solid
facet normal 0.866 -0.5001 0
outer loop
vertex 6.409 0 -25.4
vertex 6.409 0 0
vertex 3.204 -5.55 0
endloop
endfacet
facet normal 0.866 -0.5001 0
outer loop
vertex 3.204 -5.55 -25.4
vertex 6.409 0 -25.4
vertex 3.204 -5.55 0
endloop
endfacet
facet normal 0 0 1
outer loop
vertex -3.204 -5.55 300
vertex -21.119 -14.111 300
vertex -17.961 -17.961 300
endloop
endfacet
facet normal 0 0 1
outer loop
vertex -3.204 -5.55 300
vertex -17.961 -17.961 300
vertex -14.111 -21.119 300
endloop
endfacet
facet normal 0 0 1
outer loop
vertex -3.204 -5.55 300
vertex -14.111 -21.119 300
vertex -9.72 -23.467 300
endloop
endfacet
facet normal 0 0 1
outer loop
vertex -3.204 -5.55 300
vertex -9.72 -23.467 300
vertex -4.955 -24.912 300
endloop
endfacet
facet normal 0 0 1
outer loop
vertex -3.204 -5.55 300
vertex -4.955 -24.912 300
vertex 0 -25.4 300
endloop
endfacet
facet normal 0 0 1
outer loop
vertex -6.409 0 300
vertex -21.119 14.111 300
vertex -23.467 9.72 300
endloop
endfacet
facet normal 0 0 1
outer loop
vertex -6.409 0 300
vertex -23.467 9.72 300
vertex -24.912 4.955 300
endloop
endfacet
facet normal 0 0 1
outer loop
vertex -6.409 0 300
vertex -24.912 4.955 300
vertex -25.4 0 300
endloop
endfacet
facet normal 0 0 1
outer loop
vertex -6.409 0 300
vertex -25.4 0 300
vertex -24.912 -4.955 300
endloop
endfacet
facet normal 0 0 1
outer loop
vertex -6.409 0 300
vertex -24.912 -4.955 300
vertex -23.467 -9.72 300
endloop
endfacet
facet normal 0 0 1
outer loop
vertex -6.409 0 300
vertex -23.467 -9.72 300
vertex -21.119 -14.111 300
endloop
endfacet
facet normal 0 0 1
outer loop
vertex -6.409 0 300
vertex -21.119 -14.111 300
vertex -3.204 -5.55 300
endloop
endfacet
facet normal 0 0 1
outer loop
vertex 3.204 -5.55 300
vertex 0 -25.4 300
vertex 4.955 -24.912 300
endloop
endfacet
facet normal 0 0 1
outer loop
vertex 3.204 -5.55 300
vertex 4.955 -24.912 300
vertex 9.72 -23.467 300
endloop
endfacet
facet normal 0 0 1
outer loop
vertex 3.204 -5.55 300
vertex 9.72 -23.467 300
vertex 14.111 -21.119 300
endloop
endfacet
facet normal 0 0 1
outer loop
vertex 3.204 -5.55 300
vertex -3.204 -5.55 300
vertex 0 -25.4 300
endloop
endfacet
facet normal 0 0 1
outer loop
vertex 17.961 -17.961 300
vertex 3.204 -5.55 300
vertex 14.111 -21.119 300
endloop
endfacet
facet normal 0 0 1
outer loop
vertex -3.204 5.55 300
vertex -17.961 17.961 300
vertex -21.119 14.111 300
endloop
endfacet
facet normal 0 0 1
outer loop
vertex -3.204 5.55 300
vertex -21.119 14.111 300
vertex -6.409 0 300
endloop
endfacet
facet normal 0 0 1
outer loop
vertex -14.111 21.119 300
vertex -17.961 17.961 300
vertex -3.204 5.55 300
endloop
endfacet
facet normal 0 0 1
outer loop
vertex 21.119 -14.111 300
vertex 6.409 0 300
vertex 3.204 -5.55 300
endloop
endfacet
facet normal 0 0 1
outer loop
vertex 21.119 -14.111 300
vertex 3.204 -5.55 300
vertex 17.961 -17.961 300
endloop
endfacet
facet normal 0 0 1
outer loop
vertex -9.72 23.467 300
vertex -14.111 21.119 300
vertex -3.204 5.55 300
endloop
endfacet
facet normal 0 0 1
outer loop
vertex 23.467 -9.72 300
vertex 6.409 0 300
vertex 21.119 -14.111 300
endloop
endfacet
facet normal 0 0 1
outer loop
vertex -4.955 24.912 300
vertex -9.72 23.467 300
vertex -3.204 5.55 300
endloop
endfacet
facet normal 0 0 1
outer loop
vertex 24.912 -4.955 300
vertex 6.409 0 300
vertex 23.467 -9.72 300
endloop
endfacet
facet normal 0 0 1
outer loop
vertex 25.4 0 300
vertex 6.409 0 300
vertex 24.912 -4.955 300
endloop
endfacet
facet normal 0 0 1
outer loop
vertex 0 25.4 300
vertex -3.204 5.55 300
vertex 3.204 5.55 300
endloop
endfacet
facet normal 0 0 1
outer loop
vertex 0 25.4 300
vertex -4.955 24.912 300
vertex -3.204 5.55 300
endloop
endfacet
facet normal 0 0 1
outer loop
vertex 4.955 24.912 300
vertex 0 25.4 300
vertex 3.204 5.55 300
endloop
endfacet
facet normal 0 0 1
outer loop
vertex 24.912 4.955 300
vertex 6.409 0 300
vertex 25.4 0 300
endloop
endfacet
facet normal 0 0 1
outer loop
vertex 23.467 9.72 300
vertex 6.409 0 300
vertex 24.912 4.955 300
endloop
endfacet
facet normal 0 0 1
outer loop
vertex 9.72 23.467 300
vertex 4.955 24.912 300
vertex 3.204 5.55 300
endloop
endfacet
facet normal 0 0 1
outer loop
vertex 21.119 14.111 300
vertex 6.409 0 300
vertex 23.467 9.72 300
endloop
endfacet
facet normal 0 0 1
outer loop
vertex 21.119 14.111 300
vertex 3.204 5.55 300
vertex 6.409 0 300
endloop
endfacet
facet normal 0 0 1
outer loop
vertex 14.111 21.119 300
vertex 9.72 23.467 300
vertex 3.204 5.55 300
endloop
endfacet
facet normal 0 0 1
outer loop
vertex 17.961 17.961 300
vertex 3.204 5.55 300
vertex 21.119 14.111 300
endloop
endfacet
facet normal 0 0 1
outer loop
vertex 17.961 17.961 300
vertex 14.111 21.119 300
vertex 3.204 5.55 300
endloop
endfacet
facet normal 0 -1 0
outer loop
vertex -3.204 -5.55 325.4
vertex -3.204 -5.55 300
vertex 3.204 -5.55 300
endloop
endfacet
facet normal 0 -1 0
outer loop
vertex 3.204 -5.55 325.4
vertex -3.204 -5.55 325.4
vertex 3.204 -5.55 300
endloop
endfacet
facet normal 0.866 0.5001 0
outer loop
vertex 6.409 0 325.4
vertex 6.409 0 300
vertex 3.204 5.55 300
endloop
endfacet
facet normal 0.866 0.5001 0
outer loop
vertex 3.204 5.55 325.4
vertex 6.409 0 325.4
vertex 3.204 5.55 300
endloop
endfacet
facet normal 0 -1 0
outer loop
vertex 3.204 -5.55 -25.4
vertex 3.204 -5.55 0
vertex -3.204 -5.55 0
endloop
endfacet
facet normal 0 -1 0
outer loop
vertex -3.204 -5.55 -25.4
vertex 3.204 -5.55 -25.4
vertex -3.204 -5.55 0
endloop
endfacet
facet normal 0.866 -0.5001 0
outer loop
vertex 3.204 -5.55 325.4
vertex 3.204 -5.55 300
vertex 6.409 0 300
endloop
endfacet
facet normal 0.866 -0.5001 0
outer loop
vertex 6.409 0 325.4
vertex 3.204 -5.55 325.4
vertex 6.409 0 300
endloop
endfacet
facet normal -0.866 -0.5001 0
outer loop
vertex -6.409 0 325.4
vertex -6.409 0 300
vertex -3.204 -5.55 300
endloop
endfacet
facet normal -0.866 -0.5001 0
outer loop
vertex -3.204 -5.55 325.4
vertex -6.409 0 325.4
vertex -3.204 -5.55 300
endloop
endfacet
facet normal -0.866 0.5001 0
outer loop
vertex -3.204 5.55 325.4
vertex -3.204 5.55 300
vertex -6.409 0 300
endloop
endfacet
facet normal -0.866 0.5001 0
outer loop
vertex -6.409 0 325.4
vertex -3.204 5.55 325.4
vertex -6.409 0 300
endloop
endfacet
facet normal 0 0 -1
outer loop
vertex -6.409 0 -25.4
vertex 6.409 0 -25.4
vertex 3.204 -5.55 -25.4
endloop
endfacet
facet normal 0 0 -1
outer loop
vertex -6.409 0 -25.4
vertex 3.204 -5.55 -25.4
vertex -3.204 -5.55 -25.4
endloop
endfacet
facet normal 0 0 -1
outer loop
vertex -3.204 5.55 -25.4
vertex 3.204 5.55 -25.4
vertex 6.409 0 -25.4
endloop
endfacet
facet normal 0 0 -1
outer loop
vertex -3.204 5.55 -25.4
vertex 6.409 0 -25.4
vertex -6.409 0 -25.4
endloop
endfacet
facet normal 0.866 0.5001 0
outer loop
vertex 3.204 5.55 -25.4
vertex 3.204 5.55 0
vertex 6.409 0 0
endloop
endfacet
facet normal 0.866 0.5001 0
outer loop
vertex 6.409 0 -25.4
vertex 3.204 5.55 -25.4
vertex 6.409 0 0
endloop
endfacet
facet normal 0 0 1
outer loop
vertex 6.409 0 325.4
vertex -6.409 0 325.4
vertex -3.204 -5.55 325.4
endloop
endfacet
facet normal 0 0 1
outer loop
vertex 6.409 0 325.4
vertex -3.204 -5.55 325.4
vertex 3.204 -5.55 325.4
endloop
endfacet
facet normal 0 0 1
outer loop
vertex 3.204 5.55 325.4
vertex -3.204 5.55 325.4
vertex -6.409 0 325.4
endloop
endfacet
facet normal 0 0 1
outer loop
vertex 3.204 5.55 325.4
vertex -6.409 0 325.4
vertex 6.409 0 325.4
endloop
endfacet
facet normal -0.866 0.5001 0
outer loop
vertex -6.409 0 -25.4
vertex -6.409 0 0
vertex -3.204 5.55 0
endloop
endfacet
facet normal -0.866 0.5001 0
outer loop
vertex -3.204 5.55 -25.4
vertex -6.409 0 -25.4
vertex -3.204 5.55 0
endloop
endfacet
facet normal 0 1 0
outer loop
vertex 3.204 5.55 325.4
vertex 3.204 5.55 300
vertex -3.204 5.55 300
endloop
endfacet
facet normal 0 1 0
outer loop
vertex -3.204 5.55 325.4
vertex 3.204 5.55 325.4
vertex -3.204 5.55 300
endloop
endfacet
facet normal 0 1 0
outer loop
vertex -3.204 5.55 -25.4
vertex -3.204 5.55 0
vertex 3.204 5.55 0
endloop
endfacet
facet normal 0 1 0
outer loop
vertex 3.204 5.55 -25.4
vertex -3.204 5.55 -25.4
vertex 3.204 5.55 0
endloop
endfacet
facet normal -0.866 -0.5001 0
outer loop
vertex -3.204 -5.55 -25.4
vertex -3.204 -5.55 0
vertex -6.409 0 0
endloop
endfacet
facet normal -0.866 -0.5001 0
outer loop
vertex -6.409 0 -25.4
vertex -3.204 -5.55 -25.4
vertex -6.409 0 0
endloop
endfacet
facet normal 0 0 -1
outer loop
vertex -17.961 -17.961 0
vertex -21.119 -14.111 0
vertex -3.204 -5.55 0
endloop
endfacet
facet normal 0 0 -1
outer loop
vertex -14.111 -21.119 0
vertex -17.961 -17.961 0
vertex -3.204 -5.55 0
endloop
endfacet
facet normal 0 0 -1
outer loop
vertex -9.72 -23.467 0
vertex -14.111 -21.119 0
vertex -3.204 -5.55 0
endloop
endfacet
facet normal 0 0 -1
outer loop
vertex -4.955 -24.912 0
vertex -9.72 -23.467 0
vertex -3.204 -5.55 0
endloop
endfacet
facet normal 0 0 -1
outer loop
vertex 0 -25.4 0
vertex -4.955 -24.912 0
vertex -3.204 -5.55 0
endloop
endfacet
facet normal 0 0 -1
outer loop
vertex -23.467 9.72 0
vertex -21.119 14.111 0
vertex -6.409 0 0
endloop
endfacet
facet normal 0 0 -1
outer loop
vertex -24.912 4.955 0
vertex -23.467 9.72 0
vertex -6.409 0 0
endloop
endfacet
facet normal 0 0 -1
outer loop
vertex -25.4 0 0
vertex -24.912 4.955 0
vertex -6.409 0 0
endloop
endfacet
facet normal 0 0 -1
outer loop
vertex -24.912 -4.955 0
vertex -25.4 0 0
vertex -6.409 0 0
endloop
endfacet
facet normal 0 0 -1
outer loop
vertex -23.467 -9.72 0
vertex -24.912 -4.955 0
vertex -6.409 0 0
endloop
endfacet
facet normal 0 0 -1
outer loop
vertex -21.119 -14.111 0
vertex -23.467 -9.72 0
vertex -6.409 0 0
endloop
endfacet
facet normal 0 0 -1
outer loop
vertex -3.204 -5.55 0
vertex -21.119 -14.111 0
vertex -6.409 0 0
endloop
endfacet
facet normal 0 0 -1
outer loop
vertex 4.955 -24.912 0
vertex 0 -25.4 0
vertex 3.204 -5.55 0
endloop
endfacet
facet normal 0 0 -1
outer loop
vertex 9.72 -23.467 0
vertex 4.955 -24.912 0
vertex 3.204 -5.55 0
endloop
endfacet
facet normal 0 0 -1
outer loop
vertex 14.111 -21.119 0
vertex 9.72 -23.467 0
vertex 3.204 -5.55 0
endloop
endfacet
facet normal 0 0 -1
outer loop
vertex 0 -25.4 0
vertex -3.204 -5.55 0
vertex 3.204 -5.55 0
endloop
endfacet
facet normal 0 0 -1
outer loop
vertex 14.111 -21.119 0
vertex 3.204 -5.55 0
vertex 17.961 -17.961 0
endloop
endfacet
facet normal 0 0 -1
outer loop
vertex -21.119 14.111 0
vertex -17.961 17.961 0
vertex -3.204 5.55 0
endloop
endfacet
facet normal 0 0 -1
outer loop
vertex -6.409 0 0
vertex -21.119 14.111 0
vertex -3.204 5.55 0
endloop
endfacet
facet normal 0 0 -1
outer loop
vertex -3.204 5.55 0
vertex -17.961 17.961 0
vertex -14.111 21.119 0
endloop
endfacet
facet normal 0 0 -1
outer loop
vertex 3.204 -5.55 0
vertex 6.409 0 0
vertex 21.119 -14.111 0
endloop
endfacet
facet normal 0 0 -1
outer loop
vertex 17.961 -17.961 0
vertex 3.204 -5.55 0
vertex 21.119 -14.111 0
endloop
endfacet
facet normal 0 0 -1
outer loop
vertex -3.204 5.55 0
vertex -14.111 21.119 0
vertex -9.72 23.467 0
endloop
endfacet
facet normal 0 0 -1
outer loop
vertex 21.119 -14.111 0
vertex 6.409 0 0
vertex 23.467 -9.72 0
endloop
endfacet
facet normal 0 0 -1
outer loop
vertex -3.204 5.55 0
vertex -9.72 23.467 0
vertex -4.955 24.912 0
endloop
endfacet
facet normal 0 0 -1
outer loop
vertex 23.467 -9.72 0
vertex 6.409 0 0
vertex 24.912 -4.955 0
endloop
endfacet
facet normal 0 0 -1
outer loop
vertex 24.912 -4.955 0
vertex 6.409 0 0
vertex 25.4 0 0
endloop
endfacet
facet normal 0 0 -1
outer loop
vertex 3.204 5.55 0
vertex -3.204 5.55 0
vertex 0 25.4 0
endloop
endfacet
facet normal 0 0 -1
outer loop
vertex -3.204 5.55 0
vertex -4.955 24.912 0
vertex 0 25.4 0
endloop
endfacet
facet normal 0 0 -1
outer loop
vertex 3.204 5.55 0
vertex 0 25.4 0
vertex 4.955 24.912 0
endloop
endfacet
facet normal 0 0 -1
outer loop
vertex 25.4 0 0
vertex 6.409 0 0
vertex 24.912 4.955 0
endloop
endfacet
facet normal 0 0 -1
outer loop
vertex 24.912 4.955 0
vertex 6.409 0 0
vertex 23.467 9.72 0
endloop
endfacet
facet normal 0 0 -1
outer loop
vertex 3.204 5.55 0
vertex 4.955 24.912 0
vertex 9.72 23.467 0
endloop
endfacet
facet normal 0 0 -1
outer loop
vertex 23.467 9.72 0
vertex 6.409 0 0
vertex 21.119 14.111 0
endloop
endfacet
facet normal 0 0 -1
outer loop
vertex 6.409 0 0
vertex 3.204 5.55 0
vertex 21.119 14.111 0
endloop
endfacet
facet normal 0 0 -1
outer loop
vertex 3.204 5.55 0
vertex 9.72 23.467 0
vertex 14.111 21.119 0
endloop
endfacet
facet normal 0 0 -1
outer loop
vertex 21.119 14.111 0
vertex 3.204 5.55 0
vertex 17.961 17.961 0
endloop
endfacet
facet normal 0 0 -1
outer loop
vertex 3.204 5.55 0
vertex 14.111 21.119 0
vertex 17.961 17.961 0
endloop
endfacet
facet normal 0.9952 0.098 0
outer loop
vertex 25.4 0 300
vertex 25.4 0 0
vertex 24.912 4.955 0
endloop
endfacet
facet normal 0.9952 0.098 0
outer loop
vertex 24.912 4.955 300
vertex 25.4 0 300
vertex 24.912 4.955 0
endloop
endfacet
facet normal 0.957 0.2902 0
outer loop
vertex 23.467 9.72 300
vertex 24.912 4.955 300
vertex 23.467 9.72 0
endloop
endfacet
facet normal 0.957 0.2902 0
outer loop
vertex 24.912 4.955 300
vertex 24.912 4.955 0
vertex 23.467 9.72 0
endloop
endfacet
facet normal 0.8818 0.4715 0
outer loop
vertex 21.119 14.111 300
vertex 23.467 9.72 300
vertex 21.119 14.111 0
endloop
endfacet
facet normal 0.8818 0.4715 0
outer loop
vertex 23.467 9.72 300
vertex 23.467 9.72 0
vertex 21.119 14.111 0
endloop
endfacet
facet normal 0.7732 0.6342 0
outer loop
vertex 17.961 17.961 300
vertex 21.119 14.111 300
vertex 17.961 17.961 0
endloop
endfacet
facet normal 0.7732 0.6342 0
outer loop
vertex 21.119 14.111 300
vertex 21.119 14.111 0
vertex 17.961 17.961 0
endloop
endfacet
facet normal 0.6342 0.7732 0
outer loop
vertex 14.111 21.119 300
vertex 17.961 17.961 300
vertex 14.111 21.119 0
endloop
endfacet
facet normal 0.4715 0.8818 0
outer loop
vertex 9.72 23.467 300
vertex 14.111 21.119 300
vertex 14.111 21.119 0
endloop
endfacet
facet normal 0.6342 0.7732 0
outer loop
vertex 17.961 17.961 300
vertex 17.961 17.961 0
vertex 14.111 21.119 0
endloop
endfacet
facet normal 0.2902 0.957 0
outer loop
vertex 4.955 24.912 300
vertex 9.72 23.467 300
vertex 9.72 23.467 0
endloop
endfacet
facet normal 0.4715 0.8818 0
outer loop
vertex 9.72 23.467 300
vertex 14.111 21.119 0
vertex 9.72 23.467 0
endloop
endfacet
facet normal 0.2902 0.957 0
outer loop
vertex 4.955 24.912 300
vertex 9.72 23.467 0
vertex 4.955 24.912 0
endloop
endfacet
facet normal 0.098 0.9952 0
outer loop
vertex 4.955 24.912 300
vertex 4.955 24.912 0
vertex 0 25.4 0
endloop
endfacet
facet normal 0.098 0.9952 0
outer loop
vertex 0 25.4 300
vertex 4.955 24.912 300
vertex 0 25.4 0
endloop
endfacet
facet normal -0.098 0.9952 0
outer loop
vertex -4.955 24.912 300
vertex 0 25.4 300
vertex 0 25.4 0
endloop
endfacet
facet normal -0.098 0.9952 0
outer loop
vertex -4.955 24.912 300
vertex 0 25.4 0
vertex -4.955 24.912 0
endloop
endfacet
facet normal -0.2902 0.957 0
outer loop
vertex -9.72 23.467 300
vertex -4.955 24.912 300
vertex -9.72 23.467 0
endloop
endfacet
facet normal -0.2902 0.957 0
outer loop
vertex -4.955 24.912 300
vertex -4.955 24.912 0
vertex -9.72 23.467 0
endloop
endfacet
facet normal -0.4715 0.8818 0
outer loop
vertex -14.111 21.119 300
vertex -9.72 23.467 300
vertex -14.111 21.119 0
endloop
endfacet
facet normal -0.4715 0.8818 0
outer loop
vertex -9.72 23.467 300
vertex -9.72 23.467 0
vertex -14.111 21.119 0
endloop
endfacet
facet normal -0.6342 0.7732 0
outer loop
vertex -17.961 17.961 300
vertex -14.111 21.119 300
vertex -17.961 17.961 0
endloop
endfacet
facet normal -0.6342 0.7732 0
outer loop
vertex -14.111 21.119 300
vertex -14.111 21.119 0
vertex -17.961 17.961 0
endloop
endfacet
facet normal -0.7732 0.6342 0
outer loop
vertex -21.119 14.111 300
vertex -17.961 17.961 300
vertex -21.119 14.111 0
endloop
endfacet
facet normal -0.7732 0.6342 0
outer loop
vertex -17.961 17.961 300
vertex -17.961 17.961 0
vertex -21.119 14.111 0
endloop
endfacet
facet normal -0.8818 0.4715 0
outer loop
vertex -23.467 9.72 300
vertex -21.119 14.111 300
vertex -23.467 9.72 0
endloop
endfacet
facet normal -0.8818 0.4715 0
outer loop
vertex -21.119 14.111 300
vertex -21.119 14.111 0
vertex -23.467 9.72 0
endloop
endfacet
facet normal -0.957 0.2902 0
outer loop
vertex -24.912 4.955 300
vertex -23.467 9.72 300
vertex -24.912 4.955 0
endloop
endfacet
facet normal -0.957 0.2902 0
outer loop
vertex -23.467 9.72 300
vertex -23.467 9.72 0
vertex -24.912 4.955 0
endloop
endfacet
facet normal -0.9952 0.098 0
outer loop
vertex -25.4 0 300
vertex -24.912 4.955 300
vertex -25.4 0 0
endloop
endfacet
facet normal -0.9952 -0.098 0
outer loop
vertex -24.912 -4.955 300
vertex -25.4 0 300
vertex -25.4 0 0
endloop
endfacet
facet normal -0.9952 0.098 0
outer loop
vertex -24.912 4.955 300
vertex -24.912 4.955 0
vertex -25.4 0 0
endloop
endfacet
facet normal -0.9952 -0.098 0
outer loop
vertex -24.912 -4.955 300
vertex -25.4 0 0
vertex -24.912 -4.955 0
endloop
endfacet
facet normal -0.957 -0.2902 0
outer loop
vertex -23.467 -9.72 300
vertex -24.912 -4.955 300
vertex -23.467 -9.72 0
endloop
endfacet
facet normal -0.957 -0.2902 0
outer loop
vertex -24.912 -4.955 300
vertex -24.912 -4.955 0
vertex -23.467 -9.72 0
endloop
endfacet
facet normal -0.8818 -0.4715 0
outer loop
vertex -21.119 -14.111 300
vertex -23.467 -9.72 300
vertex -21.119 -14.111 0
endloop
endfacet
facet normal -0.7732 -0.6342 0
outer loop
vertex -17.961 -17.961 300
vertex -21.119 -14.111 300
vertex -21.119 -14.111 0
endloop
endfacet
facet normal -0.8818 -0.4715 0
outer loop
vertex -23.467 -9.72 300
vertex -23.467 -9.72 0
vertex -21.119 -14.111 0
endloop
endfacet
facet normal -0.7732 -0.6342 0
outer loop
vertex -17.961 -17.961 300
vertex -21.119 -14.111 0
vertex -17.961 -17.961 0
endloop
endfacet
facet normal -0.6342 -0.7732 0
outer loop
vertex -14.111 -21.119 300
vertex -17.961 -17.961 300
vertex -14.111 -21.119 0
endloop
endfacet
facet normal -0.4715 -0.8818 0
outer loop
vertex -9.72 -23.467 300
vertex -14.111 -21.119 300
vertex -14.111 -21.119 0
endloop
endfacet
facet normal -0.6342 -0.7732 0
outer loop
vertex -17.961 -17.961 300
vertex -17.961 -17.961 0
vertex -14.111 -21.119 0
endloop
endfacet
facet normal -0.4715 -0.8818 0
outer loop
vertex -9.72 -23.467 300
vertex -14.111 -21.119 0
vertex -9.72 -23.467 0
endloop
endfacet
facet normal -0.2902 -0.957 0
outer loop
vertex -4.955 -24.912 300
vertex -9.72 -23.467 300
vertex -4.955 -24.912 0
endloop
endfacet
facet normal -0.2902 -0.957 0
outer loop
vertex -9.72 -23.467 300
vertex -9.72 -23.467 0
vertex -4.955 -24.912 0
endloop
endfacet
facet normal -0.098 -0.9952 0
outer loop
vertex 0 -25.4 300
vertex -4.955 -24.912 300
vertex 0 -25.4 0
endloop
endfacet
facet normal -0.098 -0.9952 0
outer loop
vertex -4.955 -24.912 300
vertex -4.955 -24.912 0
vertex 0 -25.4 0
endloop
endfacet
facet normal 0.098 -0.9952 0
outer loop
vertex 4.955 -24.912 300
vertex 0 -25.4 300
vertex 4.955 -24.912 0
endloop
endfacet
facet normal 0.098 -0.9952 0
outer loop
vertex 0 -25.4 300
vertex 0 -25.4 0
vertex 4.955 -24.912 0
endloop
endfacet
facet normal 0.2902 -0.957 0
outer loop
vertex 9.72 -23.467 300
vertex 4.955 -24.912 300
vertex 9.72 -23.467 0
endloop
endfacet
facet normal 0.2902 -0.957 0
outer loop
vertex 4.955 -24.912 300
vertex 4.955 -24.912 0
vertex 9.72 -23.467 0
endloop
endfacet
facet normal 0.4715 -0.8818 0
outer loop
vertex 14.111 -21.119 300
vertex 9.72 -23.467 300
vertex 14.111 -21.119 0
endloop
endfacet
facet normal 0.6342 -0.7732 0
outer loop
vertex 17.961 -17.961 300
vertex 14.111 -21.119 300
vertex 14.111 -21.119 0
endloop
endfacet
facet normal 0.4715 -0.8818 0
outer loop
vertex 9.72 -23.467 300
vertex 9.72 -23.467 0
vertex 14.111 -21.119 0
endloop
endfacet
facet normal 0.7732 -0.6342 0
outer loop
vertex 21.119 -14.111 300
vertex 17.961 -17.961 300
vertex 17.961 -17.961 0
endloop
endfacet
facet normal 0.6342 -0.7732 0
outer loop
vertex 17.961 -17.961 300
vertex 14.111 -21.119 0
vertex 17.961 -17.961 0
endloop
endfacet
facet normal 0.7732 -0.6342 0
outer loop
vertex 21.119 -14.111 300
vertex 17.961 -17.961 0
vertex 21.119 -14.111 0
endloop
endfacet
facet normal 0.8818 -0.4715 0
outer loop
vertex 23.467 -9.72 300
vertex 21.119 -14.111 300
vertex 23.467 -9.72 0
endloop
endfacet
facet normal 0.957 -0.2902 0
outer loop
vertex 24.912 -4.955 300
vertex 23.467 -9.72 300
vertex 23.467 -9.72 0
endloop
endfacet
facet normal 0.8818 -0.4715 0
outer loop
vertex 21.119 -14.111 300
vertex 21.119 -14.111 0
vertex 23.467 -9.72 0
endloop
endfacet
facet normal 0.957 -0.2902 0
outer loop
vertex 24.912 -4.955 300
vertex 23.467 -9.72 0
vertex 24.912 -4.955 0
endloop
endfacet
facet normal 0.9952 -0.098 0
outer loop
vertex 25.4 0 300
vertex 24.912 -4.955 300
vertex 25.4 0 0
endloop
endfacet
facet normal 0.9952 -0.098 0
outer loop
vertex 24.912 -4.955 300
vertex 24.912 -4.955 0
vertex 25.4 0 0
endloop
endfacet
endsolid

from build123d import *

# Parameters (mm, degrees)
SKETCH1_R           = 25.4
BOSS_EXTRUDE1_DEPTH = 300
BOSS_EXTRUDE2_DEPTH = 25.4
BOSS_EXTRUDE3_DEPTH = 25.4


with BuildPart() as part:
    # Sketch1 → Boss-Extrude1 (new body)
    with BuildSketch(Plane.XY):
        Circle(SKETCH1_R)
    extrude(amount=BOSS_EXTRUDE1_DEPTH)

    # Sketch2 → Boss-Extrude2 (add)
    with BuildSketch(Plane.XY.offset(300)):
        Polygon((6.408587988, 0), (3.204293994, 5.55), (-3.204293994, 5.55), (-6.408587988, 0), (-3.204293994, -5.55), (3.204293994, -5.55), align=None)
    extrude(amount=BOSS_EXTRUDE2_DEPTH)

    # Sketch3 → Boss-Extrude3 (add)
    with BuildSketch(Plane(origin=(0, 0, 0), x_dir=(-1, 0, 0), z_dir=(0, 0, -1))):
        Polygon((6.408587988, 0), (3.204293994, 5.55), (-3.204293994, 5.55), (-6.408587988, 0), (-3.204293994, -5.55), (3.204293994, -5.55), align=None)
    extrude(amount=BOSS_EXTRUDE3_DEPTH)


solid = part.part
